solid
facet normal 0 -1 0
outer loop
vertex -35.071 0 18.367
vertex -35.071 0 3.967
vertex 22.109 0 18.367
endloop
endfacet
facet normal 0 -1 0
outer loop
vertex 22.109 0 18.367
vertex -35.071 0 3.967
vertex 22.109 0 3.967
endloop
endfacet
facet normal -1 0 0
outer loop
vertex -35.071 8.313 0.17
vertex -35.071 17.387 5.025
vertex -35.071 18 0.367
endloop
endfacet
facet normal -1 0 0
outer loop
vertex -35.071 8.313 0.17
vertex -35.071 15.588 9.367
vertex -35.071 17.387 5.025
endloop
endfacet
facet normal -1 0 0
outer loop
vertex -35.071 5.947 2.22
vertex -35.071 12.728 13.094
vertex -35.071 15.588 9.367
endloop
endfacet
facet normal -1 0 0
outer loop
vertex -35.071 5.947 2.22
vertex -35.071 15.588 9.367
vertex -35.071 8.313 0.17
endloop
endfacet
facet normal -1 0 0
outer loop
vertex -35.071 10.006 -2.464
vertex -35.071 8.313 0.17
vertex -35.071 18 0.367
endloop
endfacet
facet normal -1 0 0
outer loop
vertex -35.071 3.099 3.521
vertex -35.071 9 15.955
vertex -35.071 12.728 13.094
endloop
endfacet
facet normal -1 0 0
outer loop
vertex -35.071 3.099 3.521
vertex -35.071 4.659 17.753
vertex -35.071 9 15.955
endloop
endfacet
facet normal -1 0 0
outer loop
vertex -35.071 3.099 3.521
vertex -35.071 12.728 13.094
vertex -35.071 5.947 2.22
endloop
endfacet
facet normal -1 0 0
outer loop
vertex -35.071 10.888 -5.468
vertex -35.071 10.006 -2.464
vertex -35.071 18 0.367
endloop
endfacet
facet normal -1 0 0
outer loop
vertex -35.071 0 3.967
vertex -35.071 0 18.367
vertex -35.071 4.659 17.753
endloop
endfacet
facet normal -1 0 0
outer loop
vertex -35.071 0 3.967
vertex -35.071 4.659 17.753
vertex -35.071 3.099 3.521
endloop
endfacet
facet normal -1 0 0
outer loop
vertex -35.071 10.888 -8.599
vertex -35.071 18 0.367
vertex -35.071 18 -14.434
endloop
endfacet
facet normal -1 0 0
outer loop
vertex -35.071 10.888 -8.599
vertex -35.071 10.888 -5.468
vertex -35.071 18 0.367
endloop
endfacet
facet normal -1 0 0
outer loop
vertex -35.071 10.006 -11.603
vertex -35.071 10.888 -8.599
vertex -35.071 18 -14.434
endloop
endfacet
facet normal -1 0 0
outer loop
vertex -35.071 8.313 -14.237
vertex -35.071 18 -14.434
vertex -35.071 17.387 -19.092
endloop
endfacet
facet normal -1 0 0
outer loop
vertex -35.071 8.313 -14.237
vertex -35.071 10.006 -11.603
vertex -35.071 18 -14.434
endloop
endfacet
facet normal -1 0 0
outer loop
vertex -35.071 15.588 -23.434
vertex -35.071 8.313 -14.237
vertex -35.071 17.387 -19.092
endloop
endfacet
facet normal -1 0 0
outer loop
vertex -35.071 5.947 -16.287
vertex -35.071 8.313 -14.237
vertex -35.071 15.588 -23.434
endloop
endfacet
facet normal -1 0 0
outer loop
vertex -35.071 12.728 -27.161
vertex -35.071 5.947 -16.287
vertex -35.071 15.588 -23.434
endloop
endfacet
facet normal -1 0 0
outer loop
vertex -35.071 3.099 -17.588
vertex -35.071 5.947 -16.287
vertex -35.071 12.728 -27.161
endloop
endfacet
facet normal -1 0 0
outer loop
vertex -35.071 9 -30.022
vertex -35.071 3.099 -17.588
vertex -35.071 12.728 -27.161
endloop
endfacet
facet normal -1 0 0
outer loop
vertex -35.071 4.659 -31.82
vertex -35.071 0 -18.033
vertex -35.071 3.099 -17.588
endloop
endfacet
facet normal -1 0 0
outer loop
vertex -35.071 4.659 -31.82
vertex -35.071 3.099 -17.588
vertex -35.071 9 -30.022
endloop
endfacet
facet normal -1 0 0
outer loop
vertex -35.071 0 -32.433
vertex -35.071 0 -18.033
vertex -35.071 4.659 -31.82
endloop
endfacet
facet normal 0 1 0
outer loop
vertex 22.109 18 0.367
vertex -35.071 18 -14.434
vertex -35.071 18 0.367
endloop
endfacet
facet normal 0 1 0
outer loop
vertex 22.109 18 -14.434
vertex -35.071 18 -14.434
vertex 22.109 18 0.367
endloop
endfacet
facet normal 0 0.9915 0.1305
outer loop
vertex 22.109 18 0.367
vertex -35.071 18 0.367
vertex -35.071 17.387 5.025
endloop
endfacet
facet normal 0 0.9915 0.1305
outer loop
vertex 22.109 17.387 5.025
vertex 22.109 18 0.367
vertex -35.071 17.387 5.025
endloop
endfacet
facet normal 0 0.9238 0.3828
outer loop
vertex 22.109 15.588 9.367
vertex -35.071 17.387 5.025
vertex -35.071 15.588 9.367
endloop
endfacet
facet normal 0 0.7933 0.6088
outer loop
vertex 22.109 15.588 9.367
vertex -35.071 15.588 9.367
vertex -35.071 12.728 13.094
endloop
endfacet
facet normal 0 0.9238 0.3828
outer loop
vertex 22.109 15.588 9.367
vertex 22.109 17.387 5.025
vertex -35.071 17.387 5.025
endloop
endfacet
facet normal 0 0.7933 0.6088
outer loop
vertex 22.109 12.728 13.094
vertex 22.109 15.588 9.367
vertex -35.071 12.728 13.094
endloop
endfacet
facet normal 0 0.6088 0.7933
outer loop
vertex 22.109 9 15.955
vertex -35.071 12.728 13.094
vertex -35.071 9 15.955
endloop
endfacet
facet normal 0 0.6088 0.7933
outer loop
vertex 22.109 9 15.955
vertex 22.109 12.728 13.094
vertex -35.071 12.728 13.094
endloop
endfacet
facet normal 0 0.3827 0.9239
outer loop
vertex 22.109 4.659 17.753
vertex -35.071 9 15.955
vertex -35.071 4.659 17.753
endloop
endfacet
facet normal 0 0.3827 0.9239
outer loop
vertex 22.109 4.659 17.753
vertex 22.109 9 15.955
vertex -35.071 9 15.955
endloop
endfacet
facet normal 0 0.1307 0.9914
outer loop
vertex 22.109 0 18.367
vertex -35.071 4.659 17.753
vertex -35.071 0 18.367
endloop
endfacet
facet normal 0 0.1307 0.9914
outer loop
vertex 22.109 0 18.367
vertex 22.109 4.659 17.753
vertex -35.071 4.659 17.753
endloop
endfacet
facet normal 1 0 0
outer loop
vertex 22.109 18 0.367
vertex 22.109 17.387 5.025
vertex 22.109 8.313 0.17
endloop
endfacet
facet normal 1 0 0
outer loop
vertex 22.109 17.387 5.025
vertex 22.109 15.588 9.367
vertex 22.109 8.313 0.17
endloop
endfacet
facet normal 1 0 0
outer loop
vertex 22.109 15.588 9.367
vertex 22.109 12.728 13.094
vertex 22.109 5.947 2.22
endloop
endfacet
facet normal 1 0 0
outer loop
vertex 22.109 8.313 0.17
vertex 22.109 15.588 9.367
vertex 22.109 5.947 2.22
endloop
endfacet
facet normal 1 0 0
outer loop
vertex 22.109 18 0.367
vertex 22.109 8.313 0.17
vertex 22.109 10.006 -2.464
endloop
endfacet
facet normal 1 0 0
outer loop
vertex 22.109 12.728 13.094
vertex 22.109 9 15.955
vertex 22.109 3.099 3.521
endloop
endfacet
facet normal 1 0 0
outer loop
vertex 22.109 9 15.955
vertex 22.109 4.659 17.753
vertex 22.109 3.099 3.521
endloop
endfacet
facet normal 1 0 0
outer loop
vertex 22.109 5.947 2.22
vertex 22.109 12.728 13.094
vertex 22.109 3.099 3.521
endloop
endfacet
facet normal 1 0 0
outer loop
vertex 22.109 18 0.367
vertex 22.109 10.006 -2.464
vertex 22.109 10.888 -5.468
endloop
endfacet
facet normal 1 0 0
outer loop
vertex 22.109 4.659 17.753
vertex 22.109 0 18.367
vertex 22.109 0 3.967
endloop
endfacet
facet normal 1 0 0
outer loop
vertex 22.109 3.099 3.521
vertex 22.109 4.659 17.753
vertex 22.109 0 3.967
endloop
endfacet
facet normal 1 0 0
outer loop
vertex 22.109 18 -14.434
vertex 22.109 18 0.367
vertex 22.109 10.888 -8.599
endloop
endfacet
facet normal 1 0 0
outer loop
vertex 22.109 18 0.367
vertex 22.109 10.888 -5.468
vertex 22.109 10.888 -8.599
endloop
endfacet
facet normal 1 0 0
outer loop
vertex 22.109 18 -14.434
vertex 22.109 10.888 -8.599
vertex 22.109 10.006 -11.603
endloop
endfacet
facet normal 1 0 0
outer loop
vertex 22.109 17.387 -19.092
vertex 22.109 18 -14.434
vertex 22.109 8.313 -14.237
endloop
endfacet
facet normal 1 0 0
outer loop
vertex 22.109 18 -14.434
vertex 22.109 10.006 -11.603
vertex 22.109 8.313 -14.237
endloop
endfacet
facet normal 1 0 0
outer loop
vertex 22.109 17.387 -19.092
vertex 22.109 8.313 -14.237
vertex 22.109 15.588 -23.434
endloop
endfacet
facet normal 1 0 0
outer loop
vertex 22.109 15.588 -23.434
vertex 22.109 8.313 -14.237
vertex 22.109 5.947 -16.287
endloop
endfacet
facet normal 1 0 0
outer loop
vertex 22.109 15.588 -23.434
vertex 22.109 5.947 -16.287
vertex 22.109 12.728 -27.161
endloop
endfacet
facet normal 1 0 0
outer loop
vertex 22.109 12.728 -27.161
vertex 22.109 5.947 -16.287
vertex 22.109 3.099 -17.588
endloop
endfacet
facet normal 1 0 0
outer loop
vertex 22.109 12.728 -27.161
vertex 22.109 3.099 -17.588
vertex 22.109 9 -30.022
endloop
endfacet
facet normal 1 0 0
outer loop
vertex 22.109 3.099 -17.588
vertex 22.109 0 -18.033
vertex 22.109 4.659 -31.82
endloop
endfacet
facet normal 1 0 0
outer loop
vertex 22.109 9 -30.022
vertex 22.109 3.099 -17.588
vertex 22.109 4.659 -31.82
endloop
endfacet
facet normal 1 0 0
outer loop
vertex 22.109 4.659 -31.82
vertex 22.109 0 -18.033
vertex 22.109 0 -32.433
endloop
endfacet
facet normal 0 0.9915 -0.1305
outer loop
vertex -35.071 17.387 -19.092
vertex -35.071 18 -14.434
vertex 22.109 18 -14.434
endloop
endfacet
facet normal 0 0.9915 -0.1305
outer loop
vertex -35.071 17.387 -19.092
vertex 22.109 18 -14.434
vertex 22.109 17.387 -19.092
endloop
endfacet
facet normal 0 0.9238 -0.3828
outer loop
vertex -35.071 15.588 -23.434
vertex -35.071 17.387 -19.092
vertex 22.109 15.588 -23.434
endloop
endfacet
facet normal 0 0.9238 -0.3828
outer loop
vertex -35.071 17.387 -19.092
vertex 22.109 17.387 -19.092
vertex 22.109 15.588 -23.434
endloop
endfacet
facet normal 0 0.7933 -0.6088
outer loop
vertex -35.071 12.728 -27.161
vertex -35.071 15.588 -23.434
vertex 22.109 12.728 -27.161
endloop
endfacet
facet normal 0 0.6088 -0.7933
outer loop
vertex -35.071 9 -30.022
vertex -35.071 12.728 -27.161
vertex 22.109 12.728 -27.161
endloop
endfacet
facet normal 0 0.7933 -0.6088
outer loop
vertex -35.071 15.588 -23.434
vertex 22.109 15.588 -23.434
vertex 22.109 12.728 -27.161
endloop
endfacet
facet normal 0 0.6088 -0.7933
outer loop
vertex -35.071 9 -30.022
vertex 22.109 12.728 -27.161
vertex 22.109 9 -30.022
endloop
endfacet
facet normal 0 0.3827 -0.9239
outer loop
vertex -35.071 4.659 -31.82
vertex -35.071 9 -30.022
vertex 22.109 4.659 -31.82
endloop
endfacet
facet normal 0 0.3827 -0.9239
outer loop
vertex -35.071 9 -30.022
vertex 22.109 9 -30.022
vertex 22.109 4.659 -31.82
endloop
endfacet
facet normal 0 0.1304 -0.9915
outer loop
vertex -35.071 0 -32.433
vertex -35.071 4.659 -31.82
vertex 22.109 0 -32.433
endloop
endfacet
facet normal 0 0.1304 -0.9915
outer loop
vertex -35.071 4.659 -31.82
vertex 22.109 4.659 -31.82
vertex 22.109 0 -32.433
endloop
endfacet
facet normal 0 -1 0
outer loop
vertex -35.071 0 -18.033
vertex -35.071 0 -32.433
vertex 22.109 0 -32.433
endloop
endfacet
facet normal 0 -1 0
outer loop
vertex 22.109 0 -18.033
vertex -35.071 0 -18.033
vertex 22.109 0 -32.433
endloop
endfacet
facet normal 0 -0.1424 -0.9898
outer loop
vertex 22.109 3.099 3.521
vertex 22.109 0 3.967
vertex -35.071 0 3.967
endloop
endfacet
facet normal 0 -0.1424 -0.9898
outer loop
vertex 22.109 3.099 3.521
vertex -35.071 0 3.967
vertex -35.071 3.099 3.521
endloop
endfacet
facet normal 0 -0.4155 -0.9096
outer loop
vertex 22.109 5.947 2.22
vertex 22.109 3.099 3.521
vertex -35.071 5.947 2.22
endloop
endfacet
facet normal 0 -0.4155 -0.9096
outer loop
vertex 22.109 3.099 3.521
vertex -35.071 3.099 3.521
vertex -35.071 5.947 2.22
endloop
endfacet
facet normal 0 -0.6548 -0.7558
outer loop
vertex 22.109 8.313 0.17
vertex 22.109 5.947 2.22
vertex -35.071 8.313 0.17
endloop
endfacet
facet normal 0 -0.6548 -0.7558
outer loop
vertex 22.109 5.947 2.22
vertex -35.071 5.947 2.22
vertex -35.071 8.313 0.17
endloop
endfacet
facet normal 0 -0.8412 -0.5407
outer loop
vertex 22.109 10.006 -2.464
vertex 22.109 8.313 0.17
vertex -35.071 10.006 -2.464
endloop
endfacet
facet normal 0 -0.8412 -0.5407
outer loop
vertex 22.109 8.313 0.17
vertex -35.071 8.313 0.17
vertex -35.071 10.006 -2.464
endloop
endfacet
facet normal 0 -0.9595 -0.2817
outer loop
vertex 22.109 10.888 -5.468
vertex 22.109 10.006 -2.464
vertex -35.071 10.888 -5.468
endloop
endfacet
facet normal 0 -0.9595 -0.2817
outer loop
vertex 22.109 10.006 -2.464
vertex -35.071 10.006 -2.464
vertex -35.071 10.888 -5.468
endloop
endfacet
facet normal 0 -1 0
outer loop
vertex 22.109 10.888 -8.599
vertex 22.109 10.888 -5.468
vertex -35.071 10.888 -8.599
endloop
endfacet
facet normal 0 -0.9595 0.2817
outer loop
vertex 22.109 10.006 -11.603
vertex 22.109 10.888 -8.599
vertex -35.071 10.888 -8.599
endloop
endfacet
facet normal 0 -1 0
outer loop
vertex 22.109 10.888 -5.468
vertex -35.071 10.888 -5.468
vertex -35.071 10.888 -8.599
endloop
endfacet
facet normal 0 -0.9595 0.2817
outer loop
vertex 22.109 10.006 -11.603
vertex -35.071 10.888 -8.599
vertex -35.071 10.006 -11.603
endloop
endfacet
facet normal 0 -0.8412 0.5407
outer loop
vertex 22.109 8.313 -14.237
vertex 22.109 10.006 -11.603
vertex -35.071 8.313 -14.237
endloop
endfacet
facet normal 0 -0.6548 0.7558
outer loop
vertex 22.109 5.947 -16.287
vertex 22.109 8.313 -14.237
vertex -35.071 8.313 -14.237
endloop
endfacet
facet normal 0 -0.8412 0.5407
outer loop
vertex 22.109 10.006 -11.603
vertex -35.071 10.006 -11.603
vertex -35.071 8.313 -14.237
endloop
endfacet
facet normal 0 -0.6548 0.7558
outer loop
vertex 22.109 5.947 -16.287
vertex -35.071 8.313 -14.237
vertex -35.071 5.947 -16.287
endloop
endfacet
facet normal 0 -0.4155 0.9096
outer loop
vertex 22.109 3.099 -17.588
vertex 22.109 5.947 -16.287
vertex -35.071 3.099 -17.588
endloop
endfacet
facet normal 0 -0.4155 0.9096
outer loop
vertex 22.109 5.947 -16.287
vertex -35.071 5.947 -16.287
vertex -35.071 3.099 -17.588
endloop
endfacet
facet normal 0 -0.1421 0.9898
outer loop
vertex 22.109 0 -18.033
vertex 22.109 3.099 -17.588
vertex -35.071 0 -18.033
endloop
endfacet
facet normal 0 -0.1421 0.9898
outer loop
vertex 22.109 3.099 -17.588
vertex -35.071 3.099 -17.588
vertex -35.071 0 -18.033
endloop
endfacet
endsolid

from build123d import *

# Parameters (mm, degrees)
SKETCH1_W           = 57.18
SKETCH1_H           = 50.8
BOSS_EXTRUDE1_DEPTH = 18
SKETCH2_R           = 11
CUT_EXTRUDE1_DEPTH  = 58
FILLET2_R           = 18
FILLET3_R           = 18


with BuildPart() as part:
    # Sketch1 → Boss-Extrude1 (new body)
    with BuildSketch(Plane(origin=(0, 0, 0), x_dir=(1, 0, 0), z_dir=(0, 1, 0))):
        with Locations((-6.481243802, 7.033465199)):
            Rectangle(SKETCH1_W, SKETCH1_H)
    extrude(amount=BOSS_EXTRUDE1_DEPTH)

    # Sketch2 → Cut-Extrude1 (cut)
    with BuildSketch(Plane.ZY.offset(35.071243802)):
        with Locations((-7.033465199, 0)):
            Circle(SKETCH2_R)
    extrude(amount=-CUT_EXTRUDE1_DEPTH, mode=Mode.SUBTRACT)

    # Fillet2
    fillet2_edges = [part.edges().sort_by_distance(p)[0] for p in [
        (-6.481243802, 18, 18.366534801),
    ]]
    fillet(fillet2_edges, radius=FILLET2_R - 0.0001)  # a hair under: the kernel refuses the full size

    # Fillet3
    fillet3_edges = [part.edges().sort_by_distance(p)[0] for p in [
        (-6.481243802, 18, -32.433465199),
    ]]
    fillet(fillet3_edges, radius=FILLET3_R - 0.0001)  # a hair under: the kernel refuses the full size


solid = part.part
